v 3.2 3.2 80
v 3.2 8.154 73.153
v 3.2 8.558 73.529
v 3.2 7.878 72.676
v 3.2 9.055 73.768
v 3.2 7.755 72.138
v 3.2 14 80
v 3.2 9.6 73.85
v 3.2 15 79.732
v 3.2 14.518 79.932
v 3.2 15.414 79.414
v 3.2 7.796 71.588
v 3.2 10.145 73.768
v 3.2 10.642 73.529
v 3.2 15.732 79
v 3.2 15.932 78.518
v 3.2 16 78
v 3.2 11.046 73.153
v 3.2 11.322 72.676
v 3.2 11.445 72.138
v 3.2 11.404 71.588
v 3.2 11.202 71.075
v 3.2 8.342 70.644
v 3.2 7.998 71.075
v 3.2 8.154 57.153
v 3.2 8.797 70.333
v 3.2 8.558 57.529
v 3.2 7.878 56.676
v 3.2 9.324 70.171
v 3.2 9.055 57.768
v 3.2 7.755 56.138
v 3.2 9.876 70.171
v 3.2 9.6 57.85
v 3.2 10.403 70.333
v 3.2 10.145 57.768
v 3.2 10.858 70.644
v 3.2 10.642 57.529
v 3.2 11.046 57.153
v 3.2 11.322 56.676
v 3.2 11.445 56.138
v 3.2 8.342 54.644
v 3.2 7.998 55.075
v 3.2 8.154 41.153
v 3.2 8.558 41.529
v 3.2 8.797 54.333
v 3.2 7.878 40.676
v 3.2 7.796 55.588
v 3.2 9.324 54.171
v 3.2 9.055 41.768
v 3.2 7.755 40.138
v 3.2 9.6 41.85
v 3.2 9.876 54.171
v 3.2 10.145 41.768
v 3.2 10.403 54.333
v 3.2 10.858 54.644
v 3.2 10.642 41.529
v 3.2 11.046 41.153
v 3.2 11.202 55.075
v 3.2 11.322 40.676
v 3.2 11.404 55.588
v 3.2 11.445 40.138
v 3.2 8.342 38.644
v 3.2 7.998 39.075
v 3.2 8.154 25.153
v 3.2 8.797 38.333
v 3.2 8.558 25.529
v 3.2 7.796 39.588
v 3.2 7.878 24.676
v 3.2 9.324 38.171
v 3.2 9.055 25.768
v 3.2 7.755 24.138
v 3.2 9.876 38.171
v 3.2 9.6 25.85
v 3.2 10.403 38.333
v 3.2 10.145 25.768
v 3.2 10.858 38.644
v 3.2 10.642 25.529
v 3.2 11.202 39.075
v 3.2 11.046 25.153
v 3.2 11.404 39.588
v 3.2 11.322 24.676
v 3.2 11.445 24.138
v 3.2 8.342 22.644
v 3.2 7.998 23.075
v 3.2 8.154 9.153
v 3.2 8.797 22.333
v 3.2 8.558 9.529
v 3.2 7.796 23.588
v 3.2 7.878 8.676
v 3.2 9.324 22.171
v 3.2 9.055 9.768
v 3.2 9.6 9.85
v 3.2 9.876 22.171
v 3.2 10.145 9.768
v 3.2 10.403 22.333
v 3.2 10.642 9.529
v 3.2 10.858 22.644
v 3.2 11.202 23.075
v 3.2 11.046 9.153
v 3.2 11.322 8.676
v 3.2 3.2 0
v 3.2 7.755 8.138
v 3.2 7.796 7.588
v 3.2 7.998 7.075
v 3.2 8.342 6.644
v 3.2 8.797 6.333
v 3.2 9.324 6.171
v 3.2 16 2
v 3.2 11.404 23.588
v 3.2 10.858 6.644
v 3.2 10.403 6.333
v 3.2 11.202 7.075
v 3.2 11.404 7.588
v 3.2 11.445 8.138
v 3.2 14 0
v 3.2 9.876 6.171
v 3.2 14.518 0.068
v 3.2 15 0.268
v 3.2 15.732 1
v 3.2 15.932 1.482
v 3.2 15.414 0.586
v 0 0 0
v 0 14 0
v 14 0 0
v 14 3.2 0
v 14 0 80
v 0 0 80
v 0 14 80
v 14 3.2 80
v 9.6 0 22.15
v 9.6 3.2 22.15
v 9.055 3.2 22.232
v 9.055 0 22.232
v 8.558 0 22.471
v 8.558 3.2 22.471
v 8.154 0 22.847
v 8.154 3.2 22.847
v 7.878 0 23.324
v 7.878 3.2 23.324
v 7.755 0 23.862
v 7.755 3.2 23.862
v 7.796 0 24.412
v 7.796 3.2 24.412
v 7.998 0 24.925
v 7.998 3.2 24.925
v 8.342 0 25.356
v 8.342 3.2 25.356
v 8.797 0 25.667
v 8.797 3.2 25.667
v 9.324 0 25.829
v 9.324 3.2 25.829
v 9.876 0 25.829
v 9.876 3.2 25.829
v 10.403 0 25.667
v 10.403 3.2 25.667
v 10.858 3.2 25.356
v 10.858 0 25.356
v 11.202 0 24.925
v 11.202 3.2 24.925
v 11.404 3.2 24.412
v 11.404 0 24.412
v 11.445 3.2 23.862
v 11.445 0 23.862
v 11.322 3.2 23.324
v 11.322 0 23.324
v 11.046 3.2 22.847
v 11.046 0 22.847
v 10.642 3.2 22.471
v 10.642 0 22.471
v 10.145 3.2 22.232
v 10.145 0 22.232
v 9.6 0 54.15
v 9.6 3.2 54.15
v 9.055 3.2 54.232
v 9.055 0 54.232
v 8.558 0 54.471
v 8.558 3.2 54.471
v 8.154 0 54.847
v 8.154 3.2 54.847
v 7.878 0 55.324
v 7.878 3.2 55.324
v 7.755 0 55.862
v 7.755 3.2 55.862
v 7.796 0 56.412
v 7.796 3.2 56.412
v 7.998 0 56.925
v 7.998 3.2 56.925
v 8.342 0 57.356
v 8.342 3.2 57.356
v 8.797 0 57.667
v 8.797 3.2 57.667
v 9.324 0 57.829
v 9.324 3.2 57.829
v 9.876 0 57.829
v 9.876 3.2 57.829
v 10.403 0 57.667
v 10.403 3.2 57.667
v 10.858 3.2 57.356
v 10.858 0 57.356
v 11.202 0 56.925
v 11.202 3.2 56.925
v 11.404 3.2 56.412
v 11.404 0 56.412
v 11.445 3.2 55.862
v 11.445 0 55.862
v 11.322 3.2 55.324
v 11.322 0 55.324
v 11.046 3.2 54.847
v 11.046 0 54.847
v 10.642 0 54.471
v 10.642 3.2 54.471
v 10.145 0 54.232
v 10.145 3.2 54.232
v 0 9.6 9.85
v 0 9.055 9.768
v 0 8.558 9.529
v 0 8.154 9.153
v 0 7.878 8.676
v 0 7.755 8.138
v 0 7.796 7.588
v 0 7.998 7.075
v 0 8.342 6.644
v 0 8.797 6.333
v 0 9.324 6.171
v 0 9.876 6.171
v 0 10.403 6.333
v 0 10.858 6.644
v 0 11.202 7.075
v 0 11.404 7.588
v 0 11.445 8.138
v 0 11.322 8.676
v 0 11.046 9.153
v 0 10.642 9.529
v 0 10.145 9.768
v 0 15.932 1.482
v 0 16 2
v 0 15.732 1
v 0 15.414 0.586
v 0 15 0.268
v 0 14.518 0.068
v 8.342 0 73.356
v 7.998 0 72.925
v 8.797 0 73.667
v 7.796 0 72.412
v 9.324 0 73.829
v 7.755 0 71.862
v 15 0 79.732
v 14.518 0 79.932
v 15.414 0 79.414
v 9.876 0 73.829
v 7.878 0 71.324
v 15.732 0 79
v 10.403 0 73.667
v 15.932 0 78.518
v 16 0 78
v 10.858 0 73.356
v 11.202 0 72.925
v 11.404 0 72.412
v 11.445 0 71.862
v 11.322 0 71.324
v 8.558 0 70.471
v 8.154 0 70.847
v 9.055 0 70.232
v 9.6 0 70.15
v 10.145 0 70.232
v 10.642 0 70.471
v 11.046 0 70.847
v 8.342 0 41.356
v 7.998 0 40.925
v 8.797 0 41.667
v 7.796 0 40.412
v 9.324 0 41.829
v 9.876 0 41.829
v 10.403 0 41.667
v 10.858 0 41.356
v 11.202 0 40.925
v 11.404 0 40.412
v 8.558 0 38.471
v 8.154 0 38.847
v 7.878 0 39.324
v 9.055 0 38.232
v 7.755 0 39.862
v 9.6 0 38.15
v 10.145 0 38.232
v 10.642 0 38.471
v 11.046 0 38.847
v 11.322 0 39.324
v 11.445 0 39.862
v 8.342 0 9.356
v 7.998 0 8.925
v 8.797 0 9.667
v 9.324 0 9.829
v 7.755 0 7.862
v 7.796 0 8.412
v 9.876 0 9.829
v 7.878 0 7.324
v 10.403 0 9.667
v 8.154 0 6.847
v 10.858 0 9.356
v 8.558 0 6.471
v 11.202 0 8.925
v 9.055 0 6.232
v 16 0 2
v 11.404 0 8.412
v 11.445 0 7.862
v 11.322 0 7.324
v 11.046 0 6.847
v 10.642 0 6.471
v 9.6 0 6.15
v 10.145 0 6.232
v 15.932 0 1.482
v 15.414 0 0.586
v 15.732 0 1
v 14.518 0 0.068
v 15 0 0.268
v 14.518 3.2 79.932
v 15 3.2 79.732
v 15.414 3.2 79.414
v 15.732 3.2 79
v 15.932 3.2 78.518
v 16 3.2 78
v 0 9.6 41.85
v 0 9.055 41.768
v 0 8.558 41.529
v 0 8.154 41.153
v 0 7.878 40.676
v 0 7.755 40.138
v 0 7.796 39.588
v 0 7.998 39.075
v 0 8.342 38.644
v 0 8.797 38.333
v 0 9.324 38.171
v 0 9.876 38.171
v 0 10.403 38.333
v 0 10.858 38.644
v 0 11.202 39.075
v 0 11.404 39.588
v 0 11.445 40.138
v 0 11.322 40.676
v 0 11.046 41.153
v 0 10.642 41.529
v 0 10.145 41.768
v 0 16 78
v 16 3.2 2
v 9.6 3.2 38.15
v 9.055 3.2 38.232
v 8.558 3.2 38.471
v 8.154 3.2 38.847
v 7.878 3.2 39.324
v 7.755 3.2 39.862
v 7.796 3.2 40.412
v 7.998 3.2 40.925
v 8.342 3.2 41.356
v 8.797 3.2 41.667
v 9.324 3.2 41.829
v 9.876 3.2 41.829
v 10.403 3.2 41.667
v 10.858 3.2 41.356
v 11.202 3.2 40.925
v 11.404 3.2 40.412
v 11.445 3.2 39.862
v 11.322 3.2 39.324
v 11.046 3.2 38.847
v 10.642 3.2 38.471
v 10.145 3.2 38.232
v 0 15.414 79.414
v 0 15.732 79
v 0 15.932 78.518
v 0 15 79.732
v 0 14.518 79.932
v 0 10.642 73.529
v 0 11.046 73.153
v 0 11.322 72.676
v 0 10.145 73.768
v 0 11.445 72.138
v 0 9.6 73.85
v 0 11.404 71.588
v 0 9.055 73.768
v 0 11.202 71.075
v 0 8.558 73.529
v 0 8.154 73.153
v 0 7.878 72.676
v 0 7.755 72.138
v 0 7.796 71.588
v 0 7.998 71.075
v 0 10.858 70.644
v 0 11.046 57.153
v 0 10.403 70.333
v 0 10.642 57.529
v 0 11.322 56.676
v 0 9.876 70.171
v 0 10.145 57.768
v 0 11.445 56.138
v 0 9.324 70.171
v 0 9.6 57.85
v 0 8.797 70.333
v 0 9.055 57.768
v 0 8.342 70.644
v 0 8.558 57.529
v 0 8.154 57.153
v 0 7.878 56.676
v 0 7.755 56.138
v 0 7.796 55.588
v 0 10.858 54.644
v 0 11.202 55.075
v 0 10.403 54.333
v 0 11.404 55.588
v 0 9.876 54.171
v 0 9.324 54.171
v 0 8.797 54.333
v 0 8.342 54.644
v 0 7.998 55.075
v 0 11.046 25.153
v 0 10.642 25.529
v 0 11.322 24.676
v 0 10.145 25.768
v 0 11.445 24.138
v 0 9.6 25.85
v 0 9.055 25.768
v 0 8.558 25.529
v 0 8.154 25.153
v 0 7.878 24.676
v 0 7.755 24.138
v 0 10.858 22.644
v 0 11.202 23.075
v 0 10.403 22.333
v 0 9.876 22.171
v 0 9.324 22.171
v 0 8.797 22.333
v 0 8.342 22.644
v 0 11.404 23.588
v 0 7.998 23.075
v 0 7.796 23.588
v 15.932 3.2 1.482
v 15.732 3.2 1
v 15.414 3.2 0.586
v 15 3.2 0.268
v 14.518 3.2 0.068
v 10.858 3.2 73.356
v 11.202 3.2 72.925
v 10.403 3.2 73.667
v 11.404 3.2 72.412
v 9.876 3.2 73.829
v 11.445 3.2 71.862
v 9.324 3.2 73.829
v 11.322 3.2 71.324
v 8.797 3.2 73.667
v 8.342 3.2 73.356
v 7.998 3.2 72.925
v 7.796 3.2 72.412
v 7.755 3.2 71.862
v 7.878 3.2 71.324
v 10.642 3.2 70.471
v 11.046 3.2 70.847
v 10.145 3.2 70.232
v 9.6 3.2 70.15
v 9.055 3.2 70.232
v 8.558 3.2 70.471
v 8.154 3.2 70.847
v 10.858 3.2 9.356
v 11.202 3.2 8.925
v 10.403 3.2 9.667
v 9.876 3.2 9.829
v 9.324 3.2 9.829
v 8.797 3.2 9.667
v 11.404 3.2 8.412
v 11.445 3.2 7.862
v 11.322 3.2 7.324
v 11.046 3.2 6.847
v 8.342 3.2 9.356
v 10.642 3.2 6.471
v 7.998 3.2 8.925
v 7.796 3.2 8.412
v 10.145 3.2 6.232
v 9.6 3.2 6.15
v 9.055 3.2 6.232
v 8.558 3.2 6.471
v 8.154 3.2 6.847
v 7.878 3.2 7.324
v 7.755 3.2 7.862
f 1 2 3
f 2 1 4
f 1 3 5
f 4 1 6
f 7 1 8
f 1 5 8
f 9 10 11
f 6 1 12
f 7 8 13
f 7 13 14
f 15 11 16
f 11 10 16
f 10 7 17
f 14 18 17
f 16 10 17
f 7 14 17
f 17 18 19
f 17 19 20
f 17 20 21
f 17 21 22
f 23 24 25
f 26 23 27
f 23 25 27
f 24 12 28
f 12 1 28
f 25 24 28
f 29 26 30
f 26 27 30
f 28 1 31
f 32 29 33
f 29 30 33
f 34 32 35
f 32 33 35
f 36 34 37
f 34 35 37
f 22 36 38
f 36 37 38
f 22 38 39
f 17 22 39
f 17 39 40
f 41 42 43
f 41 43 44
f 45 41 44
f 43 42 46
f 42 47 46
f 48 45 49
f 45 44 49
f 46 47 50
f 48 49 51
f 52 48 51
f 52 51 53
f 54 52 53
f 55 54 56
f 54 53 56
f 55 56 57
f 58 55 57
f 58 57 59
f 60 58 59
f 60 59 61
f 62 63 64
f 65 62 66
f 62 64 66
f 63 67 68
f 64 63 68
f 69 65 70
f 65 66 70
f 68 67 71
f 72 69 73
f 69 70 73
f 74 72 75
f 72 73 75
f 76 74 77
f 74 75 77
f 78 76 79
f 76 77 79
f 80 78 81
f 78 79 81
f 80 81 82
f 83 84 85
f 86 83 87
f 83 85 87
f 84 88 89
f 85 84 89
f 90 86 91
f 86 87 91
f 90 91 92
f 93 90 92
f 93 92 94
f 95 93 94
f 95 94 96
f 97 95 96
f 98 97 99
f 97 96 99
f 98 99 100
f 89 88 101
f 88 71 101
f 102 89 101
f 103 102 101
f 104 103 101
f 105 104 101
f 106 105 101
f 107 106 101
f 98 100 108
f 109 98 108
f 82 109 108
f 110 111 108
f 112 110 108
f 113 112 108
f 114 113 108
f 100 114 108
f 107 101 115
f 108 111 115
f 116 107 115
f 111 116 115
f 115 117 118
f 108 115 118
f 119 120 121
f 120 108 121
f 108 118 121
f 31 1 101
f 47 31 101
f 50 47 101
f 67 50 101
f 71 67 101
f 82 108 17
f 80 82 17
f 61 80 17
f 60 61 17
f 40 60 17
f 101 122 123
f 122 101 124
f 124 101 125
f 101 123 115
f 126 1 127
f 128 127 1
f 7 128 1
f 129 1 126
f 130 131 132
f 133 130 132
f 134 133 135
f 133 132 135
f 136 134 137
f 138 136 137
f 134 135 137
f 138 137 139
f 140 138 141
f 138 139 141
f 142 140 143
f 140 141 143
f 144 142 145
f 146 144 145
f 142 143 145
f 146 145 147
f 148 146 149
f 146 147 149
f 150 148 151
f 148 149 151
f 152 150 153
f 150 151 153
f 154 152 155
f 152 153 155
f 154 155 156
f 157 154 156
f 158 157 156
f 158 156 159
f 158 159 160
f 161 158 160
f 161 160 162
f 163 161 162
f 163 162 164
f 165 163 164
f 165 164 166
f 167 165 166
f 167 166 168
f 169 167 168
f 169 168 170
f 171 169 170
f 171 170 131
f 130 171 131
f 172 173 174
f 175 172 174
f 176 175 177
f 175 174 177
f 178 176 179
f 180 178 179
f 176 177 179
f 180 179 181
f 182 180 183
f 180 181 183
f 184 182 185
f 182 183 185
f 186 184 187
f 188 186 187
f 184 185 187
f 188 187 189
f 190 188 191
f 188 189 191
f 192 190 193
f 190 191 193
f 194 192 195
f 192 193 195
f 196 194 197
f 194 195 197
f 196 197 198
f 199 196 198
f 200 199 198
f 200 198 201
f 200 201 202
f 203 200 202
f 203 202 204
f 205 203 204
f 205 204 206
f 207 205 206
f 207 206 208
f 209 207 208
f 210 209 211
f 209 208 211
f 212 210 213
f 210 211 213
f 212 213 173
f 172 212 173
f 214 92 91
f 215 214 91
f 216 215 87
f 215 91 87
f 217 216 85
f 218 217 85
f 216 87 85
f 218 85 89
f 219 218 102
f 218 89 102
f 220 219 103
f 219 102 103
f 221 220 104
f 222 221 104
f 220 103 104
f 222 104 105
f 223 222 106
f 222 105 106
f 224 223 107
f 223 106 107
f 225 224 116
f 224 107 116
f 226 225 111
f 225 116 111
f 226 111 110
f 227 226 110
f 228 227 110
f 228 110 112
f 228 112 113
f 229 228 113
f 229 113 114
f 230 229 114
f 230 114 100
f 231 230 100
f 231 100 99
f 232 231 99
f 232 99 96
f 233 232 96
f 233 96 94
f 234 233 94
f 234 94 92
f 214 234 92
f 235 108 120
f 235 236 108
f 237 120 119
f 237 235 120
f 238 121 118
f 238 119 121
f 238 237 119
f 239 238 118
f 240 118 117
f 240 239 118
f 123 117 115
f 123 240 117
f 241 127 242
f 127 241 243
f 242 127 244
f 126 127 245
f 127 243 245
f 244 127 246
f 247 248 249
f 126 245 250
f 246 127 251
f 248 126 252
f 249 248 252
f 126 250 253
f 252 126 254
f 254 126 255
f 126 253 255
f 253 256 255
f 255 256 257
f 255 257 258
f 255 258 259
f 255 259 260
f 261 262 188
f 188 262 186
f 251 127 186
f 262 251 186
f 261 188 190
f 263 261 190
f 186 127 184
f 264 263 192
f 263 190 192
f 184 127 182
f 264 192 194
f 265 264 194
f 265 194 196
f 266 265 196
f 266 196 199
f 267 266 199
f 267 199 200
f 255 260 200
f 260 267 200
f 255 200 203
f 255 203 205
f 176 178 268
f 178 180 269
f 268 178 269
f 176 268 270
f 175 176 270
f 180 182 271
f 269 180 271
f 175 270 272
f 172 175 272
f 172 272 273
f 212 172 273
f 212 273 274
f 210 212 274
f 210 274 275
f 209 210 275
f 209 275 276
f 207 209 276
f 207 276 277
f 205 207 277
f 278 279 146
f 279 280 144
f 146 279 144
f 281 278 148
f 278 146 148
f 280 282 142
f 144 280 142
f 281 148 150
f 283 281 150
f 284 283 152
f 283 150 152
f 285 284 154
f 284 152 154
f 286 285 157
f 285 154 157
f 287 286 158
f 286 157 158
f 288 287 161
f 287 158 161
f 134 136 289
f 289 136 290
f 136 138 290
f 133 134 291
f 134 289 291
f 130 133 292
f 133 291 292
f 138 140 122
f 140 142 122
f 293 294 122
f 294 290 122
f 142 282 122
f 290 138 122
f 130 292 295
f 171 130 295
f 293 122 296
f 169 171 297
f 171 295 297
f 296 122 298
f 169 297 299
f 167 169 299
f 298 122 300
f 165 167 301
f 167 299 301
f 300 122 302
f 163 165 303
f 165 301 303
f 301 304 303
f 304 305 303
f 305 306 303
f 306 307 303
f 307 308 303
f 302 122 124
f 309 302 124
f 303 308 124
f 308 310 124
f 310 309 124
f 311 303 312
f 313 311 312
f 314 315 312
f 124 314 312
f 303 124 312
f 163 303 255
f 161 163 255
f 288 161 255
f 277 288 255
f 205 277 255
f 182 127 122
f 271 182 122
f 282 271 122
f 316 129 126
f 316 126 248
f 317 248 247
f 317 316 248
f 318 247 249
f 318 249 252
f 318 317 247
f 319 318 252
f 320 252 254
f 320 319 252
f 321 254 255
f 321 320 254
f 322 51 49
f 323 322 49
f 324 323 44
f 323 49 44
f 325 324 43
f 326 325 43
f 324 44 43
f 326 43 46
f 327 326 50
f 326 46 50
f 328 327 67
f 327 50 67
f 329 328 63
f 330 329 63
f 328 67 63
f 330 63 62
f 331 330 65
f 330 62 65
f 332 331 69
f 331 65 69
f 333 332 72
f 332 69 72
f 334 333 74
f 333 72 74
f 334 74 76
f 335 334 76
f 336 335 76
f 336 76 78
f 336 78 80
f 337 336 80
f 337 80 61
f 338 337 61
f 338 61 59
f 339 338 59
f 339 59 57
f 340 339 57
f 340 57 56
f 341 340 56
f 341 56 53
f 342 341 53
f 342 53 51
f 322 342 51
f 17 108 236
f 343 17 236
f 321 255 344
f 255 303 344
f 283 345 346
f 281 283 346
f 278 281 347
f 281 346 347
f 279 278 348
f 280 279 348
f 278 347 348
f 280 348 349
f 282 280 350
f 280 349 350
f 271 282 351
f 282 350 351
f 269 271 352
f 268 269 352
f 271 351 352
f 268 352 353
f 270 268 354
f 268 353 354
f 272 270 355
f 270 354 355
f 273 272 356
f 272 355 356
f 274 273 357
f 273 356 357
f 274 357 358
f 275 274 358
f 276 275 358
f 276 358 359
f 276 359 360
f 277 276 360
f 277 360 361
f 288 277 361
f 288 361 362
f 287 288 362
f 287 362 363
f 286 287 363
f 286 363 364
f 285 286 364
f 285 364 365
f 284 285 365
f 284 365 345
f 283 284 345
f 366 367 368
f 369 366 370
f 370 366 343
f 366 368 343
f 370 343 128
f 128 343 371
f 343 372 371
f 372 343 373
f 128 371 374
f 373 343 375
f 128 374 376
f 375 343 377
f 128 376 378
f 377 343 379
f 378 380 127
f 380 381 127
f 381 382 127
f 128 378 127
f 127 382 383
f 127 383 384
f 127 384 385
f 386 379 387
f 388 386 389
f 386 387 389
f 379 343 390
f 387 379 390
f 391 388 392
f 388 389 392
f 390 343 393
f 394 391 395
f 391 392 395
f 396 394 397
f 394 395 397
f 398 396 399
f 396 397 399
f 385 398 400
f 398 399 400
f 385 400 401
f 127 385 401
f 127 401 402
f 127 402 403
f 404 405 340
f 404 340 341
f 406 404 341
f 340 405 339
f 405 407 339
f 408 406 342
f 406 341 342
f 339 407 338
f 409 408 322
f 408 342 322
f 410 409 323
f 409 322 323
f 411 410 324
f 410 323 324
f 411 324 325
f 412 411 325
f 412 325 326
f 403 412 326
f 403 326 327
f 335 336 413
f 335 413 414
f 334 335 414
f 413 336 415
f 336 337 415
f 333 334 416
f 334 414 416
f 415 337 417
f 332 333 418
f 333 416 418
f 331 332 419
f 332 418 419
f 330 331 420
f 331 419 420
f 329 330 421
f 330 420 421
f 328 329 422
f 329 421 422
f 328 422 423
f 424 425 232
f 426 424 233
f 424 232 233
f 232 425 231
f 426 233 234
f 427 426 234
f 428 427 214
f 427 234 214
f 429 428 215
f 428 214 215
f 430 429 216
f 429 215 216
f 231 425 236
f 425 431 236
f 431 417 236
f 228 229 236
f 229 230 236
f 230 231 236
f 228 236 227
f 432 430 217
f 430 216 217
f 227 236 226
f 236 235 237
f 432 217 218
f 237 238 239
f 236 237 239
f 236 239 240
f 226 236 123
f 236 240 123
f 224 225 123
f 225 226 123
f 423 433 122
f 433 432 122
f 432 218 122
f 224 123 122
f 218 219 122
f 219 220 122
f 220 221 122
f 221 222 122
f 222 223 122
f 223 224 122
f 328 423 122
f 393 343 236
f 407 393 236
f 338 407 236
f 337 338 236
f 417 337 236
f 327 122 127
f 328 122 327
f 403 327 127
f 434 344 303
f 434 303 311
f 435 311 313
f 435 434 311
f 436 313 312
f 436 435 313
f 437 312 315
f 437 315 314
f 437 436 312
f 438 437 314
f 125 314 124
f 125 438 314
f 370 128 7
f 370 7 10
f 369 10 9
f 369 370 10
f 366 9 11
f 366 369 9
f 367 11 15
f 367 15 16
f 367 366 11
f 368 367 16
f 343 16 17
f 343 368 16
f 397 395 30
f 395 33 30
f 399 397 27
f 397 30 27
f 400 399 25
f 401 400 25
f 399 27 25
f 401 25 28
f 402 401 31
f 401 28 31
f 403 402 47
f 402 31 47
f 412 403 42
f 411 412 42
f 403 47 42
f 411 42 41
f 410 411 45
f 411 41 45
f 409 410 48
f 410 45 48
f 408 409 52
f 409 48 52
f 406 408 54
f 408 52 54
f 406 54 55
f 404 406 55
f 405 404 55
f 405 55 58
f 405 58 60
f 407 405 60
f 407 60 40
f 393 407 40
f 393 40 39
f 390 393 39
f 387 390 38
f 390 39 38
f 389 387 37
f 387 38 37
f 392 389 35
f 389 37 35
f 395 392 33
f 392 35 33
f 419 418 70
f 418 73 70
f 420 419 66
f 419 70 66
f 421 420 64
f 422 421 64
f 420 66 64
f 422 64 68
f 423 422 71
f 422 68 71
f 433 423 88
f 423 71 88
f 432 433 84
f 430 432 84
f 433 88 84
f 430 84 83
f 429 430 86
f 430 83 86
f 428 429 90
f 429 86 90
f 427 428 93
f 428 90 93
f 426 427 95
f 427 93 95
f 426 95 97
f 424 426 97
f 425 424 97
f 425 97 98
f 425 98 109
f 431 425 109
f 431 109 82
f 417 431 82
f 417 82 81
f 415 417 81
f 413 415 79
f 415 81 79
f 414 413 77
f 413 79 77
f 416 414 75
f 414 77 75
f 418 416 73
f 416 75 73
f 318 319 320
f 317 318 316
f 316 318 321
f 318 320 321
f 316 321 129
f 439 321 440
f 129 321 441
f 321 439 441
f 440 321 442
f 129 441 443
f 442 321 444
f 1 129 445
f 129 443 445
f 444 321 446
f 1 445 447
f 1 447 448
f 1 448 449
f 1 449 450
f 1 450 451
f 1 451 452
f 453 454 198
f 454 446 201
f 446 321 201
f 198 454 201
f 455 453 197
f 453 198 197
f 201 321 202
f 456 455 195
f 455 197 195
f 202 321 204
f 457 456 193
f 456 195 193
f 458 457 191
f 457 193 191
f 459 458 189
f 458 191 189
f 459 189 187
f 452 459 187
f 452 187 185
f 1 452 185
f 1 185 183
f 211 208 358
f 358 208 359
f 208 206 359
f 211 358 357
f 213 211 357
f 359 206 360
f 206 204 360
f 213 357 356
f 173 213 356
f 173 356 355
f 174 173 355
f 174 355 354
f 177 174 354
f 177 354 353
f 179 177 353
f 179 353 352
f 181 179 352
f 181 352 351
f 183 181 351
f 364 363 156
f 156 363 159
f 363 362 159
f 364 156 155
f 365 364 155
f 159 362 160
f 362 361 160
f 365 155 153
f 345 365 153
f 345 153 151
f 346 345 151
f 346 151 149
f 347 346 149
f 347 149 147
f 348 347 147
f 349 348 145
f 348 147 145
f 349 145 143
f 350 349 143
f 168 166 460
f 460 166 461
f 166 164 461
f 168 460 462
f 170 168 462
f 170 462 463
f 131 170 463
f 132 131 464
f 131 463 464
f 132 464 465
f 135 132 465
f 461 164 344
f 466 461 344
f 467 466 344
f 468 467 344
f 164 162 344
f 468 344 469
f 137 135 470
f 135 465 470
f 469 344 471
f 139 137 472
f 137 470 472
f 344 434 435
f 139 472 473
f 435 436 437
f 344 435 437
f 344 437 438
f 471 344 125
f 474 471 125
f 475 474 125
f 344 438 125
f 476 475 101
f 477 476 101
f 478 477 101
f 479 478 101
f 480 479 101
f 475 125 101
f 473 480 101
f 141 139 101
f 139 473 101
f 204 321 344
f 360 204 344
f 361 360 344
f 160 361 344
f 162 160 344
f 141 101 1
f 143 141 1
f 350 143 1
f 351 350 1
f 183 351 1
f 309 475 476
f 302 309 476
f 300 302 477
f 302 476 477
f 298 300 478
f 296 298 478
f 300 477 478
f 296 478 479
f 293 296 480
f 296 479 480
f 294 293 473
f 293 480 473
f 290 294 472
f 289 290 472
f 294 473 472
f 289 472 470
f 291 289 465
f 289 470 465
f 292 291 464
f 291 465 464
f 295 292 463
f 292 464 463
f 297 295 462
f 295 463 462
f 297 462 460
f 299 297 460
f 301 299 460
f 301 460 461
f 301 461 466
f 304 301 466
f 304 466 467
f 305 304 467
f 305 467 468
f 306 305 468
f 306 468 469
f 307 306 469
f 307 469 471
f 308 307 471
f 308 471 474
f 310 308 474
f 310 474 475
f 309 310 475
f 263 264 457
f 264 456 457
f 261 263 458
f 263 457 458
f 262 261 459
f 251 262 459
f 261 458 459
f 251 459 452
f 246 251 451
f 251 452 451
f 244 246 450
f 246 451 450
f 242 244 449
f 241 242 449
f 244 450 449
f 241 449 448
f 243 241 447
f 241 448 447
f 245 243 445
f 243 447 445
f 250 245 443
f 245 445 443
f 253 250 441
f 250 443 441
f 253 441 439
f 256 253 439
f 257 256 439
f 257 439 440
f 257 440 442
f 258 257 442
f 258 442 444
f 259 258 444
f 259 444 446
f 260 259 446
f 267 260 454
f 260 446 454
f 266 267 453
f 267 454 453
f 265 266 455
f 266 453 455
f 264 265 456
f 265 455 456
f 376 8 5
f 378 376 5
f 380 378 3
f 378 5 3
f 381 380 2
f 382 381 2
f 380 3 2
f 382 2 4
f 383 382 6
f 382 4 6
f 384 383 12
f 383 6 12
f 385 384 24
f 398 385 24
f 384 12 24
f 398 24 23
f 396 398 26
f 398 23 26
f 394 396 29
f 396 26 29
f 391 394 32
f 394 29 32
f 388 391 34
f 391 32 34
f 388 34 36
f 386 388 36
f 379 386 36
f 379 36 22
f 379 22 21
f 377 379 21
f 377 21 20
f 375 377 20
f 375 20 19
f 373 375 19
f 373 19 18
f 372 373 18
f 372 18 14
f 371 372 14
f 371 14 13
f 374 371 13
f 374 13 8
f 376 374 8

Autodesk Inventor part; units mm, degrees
ref_plane "FRONT" through (0, 0, 0) normal (0, 0, 1) x (1, 0, 0)
ref_plane "TOP" through (0, 0, 0) normal (0, 1, 0) x (-1, 0, 0)
ref_plane "RIGHT" through (0, 0, 0) normal (1, 0, 0) x (0, 1, 0)
ref_plane "Work Plane4" through (0, 0, 0) normal (0, 0, 1) x (1, 0, 0)
sketch "Sketch1" plane through (0, 0, 0) normal (0, 0, 1) x (1, 0, 0)
  line L0 (3.2, 16) -> (0, 16) projected
  line L1 (3.2, 3.2) -> (3.2, 14) projected
  line L2 (3.2, 14) -> (3.2, 16) projected
  line L3 (0, 16) -> (0, 14) projected
  line L4 (0, 14) -> (0, 0) projected
  line L5 (0, 0) -> (14, 0) projected
  line L6 (16, 0) -> (16, 3.2) projected
  line L7 (16, 3.2) -> (14, 3.2) projected
  line L8 (14, 3.2) -> (3.2, 3.2) projected
  line L9 (14, 0) -> (16, 0) projected
extrude "Extrusion1" add sketch "Sketch1" along normal blind 80
sketch "Sketch2" plane through (0, 0, 0) normal (-1, 0, 0) x (0, 0, 1)
  circle A0 centre (8, 9.6) radius 1.85 projected
  circle A1 centre (24, 9.6) radius 1.85 projected
  circle A2 centre (40, 9.6) radius 1.85 projected
  circle A3 centre (56, 9.6) radius 1.85 projected
  circle A4 centre (72, 9.6) radius 1.85 projected
  point P0 (0, 0)
hole "Hole1" at (0, 9.6, 8) at (0, 9.6, 24) at (0, 9.6, 40) at (0, 9.6, 56) at (0, 9.6, 72) direction (1, 0, 0) diameter 3.7 end through all
sketch "Sketch3" plane through (0, 0, 0) normal (0, -1, 0) x (1, 0, 0)
  circle A0 centre (9.6, 56) radius 1.85 projected
  circle A1 centre (9.6, 40) radius 1.85 projected
  circle A2 centre (9.6, 24) radius 1.85 projected
  circle A3 centre (9.6, 8) radius 1.85 projected
  circle A4 centre (9.6, 72) radius 1.85 projected
  point P0 (0, 0)
hole "Hole2" at (9.6, 0, 8) at (9.6, 0, 24) at (9.6, 0, 40) at (9.6, 0, 56) at (9.6, 0, 72) direction (0, 1, 0) diameter 3.7 end through all
fillet "Fillet1" radius 2 1 edges at (16, 1.6, 80)
fillet "Fillet2" radius 2 3 edges at (1.6, 16, 80) (1.6, 16, 0) (16, 1.6, 0)
properties part number "inside Angle beam"
